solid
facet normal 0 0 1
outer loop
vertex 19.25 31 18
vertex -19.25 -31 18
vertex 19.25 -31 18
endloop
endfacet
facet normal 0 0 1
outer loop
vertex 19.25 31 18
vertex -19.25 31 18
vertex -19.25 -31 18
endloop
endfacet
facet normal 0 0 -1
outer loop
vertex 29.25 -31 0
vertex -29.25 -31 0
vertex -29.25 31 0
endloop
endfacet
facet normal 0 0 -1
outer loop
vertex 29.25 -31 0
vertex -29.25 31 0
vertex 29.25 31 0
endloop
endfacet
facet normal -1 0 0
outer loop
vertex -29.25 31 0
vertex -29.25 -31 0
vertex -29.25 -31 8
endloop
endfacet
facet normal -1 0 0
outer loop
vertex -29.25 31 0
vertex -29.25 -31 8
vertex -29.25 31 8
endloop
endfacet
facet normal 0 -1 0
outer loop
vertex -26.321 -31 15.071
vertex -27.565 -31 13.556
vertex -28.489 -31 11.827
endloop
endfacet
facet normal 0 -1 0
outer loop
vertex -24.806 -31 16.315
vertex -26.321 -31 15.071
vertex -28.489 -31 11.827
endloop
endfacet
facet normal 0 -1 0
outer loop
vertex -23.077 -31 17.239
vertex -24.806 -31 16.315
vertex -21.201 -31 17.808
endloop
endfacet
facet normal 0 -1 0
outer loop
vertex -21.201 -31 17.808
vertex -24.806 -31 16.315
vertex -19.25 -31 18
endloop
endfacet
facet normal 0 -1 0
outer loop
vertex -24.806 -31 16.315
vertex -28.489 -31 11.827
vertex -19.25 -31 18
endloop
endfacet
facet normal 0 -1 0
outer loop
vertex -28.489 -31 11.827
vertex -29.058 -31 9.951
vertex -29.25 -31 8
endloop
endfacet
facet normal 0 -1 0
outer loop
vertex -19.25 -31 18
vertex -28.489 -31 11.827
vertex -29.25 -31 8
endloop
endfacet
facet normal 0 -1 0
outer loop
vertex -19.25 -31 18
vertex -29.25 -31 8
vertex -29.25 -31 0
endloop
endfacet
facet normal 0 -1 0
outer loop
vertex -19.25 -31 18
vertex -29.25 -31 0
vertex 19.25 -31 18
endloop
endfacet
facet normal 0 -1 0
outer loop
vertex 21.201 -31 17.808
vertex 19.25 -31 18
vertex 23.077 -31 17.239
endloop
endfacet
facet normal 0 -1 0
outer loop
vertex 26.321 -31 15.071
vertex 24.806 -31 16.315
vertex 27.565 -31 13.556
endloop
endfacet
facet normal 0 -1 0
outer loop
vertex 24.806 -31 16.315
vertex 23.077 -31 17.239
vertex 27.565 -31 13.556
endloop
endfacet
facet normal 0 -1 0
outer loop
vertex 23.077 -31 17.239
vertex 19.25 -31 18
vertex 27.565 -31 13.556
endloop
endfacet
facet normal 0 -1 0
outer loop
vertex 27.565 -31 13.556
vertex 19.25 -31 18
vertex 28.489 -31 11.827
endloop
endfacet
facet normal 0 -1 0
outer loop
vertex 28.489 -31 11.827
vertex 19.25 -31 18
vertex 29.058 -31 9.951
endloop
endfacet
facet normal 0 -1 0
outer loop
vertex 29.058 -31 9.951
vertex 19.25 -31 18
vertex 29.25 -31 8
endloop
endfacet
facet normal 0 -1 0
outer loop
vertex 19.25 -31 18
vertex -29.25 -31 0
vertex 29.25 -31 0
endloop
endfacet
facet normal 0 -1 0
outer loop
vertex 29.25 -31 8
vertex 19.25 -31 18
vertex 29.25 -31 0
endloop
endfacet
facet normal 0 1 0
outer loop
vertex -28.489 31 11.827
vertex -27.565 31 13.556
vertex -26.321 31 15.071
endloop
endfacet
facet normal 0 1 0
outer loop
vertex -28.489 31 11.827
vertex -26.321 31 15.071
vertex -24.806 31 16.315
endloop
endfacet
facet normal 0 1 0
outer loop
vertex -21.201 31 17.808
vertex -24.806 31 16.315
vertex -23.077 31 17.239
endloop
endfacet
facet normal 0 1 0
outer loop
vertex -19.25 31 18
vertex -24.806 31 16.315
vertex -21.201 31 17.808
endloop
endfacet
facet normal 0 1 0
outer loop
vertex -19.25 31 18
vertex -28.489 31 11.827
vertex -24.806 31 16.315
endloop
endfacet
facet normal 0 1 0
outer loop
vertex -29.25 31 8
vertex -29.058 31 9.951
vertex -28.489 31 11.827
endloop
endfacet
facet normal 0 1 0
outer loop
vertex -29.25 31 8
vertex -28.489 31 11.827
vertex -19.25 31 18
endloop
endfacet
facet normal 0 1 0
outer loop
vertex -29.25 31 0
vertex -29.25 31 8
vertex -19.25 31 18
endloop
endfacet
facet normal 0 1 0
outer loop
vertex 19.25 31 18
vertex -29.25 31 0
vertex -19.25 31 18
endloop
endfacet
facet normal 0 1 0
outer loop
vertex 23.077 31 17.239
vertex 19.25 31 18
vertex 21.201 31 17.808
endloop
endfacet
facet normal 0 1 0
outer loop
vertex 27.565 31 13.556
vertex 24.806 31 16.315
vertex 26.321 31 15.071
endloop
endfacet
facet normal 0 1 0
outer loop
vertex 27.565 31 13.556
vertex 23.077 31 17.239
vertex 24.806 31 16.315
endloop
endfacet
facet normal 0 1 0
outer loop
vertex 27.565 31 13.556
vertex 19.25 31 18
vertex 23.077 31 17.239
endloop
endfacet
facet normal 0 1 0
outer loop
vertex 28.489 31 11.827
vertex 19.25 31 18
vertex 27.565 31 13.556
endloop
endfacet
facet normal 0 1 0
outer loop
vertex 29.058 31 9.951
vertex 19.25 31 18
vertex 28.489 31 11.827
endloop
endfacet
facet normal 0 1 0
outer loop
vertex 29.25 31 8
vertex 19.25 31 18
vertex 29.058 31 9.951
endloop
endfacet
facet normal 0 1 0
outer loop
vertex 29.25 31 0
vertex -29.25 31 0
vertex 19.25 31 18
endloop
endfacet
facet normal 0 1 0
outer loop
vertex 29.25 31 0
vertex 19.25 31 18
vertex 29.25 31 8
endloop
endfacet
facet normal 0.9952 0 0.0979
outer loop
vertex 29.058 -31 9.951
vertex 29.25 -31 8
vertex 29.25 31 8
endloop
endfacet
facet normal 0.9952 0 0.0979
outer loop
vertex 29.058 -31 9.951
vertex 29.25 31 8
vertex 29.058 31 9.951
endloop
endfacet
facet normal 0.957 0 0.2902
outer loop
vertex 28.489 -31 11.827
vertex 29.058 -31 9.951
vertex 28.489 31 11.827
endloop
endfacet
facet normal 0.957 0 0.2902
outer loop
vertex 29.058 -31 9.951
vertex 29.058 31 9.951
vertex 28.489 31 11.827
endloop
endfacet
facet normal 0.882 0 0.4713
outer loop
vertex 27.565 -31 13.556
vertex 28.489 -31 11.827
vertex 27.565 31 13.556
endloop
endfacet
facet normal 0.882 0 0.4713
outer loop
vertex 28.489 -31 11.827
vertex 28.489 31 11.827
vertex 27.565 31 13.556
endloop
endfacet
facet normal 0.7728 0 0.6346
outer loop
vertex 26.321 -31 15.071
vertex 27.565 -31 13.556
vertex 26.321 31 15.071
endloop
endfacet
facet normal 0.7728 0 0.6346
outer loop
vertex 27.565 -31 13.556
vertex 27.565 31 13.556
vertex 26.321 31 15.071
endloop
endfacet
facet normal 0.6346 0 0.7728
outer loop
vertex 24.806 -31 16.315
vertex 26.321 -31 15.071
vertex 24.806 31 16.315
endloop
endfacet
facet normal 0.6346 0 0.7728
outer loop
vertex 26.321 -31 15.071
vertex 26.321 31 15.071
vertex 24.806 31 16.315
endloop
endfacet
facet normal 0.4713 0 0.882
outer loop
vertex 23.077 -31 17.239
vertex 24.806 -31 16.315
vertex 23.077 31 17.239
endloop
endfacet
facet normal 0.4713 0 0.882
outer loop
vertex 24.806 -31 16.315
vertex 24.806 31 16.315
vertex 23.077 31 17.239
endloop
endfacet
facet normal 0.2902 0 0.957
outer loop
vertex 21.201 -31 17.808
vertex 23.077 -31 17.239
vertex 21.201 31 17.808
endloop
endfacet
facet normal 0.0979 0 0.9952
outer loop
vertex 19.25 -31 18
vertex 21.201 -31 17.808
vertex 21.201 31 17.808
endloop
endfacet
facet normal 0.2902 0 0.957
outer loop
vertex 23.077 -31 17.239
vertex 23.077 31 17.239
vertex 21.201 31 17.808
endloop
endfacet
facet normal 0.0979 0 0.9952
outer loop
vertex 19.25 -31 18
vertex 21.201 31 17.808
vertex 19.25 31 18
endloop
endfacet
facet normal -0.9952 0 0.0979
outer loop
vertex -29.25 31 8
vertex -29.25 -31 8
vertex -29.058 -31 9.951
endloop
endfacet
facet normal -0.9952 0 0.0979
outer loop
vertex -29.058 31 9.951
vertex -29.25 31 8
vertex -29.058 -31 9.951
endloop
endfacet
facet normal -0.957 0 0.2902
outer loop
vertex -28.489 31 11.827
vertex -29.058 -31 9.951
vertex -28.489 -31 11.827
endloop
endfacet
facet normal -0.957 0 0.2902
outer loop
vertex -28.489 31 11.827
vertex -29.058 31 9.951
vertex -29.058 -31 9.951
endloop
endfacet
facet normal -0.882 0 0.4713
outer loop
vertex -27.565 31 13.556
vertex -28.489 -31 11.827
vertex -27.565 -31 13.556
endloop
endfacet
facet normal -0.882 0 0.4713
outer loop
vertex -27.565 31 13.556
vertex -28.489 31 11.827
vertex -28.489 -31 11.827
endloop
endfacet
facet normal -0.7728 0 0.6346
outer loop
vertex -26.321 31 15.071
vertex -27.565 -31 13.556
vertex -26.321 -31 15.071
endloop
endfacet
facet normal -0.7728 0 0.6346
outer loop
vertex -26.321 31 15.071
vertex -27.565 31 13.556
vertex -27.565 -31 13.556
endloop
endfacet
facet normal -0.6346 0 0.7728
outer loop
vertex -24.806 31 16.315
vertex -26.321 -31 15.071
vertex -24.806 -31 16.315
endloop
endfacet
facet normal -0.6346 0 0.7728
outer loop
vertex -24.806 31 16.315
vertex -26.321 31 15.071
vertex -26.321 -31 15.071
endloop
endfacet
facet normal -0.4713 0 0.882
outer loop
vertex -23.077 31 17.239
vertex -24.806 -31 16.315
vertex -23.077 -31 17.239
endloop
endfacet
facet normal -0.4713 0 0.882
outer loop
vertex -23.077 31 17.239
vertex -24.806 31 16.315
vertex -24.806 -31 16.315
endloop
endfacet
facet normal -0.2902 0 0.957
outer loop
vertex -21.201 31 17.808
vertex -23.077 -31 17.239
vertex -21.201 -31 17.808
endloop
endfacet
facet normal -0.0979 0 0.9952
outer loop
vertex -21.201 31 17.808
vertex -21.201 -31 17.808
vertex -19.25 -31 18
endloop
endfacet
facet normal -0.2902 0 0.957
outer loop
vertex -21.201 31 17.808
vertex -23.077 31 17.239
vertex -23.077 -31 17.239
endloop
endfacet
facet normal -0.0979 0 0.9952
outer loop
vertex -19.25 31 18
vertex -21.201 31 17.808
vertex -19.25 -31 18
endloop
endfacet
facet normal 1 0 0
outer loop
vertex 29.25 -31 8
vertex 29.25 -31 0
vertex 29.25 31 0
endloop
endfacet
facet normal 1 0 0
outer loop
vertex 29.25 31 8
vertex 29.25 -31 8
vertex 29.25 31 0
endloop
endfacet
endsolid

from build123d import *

# Parameters (mm, degrees)
SKETCH1_W           = 58.5
SKETCH1_H           = 62
BOSS_EXTRUDE1_DEPTH = 18
FILLET1_R           = 10


with BuildPart() as part:
    # Sketch1 → Boss-Extrude1 (new body)
    with BuildSketch(Plane.XY):
        Rectangle(SKETCH1_W, SKETCH1_H)
    extrude(amount=BOSS_EXTRUDE1_DEPTH)

    # Fillet1
    fillet1_edges = [part.edges().sort_by_distance(p)[0] for p in [
        (-29.25, 0, 18),
        (29.25, 0, 18),
    ]]
    fillet(fillet1_edges, radius=FILLET1_R)


solid = part.part
